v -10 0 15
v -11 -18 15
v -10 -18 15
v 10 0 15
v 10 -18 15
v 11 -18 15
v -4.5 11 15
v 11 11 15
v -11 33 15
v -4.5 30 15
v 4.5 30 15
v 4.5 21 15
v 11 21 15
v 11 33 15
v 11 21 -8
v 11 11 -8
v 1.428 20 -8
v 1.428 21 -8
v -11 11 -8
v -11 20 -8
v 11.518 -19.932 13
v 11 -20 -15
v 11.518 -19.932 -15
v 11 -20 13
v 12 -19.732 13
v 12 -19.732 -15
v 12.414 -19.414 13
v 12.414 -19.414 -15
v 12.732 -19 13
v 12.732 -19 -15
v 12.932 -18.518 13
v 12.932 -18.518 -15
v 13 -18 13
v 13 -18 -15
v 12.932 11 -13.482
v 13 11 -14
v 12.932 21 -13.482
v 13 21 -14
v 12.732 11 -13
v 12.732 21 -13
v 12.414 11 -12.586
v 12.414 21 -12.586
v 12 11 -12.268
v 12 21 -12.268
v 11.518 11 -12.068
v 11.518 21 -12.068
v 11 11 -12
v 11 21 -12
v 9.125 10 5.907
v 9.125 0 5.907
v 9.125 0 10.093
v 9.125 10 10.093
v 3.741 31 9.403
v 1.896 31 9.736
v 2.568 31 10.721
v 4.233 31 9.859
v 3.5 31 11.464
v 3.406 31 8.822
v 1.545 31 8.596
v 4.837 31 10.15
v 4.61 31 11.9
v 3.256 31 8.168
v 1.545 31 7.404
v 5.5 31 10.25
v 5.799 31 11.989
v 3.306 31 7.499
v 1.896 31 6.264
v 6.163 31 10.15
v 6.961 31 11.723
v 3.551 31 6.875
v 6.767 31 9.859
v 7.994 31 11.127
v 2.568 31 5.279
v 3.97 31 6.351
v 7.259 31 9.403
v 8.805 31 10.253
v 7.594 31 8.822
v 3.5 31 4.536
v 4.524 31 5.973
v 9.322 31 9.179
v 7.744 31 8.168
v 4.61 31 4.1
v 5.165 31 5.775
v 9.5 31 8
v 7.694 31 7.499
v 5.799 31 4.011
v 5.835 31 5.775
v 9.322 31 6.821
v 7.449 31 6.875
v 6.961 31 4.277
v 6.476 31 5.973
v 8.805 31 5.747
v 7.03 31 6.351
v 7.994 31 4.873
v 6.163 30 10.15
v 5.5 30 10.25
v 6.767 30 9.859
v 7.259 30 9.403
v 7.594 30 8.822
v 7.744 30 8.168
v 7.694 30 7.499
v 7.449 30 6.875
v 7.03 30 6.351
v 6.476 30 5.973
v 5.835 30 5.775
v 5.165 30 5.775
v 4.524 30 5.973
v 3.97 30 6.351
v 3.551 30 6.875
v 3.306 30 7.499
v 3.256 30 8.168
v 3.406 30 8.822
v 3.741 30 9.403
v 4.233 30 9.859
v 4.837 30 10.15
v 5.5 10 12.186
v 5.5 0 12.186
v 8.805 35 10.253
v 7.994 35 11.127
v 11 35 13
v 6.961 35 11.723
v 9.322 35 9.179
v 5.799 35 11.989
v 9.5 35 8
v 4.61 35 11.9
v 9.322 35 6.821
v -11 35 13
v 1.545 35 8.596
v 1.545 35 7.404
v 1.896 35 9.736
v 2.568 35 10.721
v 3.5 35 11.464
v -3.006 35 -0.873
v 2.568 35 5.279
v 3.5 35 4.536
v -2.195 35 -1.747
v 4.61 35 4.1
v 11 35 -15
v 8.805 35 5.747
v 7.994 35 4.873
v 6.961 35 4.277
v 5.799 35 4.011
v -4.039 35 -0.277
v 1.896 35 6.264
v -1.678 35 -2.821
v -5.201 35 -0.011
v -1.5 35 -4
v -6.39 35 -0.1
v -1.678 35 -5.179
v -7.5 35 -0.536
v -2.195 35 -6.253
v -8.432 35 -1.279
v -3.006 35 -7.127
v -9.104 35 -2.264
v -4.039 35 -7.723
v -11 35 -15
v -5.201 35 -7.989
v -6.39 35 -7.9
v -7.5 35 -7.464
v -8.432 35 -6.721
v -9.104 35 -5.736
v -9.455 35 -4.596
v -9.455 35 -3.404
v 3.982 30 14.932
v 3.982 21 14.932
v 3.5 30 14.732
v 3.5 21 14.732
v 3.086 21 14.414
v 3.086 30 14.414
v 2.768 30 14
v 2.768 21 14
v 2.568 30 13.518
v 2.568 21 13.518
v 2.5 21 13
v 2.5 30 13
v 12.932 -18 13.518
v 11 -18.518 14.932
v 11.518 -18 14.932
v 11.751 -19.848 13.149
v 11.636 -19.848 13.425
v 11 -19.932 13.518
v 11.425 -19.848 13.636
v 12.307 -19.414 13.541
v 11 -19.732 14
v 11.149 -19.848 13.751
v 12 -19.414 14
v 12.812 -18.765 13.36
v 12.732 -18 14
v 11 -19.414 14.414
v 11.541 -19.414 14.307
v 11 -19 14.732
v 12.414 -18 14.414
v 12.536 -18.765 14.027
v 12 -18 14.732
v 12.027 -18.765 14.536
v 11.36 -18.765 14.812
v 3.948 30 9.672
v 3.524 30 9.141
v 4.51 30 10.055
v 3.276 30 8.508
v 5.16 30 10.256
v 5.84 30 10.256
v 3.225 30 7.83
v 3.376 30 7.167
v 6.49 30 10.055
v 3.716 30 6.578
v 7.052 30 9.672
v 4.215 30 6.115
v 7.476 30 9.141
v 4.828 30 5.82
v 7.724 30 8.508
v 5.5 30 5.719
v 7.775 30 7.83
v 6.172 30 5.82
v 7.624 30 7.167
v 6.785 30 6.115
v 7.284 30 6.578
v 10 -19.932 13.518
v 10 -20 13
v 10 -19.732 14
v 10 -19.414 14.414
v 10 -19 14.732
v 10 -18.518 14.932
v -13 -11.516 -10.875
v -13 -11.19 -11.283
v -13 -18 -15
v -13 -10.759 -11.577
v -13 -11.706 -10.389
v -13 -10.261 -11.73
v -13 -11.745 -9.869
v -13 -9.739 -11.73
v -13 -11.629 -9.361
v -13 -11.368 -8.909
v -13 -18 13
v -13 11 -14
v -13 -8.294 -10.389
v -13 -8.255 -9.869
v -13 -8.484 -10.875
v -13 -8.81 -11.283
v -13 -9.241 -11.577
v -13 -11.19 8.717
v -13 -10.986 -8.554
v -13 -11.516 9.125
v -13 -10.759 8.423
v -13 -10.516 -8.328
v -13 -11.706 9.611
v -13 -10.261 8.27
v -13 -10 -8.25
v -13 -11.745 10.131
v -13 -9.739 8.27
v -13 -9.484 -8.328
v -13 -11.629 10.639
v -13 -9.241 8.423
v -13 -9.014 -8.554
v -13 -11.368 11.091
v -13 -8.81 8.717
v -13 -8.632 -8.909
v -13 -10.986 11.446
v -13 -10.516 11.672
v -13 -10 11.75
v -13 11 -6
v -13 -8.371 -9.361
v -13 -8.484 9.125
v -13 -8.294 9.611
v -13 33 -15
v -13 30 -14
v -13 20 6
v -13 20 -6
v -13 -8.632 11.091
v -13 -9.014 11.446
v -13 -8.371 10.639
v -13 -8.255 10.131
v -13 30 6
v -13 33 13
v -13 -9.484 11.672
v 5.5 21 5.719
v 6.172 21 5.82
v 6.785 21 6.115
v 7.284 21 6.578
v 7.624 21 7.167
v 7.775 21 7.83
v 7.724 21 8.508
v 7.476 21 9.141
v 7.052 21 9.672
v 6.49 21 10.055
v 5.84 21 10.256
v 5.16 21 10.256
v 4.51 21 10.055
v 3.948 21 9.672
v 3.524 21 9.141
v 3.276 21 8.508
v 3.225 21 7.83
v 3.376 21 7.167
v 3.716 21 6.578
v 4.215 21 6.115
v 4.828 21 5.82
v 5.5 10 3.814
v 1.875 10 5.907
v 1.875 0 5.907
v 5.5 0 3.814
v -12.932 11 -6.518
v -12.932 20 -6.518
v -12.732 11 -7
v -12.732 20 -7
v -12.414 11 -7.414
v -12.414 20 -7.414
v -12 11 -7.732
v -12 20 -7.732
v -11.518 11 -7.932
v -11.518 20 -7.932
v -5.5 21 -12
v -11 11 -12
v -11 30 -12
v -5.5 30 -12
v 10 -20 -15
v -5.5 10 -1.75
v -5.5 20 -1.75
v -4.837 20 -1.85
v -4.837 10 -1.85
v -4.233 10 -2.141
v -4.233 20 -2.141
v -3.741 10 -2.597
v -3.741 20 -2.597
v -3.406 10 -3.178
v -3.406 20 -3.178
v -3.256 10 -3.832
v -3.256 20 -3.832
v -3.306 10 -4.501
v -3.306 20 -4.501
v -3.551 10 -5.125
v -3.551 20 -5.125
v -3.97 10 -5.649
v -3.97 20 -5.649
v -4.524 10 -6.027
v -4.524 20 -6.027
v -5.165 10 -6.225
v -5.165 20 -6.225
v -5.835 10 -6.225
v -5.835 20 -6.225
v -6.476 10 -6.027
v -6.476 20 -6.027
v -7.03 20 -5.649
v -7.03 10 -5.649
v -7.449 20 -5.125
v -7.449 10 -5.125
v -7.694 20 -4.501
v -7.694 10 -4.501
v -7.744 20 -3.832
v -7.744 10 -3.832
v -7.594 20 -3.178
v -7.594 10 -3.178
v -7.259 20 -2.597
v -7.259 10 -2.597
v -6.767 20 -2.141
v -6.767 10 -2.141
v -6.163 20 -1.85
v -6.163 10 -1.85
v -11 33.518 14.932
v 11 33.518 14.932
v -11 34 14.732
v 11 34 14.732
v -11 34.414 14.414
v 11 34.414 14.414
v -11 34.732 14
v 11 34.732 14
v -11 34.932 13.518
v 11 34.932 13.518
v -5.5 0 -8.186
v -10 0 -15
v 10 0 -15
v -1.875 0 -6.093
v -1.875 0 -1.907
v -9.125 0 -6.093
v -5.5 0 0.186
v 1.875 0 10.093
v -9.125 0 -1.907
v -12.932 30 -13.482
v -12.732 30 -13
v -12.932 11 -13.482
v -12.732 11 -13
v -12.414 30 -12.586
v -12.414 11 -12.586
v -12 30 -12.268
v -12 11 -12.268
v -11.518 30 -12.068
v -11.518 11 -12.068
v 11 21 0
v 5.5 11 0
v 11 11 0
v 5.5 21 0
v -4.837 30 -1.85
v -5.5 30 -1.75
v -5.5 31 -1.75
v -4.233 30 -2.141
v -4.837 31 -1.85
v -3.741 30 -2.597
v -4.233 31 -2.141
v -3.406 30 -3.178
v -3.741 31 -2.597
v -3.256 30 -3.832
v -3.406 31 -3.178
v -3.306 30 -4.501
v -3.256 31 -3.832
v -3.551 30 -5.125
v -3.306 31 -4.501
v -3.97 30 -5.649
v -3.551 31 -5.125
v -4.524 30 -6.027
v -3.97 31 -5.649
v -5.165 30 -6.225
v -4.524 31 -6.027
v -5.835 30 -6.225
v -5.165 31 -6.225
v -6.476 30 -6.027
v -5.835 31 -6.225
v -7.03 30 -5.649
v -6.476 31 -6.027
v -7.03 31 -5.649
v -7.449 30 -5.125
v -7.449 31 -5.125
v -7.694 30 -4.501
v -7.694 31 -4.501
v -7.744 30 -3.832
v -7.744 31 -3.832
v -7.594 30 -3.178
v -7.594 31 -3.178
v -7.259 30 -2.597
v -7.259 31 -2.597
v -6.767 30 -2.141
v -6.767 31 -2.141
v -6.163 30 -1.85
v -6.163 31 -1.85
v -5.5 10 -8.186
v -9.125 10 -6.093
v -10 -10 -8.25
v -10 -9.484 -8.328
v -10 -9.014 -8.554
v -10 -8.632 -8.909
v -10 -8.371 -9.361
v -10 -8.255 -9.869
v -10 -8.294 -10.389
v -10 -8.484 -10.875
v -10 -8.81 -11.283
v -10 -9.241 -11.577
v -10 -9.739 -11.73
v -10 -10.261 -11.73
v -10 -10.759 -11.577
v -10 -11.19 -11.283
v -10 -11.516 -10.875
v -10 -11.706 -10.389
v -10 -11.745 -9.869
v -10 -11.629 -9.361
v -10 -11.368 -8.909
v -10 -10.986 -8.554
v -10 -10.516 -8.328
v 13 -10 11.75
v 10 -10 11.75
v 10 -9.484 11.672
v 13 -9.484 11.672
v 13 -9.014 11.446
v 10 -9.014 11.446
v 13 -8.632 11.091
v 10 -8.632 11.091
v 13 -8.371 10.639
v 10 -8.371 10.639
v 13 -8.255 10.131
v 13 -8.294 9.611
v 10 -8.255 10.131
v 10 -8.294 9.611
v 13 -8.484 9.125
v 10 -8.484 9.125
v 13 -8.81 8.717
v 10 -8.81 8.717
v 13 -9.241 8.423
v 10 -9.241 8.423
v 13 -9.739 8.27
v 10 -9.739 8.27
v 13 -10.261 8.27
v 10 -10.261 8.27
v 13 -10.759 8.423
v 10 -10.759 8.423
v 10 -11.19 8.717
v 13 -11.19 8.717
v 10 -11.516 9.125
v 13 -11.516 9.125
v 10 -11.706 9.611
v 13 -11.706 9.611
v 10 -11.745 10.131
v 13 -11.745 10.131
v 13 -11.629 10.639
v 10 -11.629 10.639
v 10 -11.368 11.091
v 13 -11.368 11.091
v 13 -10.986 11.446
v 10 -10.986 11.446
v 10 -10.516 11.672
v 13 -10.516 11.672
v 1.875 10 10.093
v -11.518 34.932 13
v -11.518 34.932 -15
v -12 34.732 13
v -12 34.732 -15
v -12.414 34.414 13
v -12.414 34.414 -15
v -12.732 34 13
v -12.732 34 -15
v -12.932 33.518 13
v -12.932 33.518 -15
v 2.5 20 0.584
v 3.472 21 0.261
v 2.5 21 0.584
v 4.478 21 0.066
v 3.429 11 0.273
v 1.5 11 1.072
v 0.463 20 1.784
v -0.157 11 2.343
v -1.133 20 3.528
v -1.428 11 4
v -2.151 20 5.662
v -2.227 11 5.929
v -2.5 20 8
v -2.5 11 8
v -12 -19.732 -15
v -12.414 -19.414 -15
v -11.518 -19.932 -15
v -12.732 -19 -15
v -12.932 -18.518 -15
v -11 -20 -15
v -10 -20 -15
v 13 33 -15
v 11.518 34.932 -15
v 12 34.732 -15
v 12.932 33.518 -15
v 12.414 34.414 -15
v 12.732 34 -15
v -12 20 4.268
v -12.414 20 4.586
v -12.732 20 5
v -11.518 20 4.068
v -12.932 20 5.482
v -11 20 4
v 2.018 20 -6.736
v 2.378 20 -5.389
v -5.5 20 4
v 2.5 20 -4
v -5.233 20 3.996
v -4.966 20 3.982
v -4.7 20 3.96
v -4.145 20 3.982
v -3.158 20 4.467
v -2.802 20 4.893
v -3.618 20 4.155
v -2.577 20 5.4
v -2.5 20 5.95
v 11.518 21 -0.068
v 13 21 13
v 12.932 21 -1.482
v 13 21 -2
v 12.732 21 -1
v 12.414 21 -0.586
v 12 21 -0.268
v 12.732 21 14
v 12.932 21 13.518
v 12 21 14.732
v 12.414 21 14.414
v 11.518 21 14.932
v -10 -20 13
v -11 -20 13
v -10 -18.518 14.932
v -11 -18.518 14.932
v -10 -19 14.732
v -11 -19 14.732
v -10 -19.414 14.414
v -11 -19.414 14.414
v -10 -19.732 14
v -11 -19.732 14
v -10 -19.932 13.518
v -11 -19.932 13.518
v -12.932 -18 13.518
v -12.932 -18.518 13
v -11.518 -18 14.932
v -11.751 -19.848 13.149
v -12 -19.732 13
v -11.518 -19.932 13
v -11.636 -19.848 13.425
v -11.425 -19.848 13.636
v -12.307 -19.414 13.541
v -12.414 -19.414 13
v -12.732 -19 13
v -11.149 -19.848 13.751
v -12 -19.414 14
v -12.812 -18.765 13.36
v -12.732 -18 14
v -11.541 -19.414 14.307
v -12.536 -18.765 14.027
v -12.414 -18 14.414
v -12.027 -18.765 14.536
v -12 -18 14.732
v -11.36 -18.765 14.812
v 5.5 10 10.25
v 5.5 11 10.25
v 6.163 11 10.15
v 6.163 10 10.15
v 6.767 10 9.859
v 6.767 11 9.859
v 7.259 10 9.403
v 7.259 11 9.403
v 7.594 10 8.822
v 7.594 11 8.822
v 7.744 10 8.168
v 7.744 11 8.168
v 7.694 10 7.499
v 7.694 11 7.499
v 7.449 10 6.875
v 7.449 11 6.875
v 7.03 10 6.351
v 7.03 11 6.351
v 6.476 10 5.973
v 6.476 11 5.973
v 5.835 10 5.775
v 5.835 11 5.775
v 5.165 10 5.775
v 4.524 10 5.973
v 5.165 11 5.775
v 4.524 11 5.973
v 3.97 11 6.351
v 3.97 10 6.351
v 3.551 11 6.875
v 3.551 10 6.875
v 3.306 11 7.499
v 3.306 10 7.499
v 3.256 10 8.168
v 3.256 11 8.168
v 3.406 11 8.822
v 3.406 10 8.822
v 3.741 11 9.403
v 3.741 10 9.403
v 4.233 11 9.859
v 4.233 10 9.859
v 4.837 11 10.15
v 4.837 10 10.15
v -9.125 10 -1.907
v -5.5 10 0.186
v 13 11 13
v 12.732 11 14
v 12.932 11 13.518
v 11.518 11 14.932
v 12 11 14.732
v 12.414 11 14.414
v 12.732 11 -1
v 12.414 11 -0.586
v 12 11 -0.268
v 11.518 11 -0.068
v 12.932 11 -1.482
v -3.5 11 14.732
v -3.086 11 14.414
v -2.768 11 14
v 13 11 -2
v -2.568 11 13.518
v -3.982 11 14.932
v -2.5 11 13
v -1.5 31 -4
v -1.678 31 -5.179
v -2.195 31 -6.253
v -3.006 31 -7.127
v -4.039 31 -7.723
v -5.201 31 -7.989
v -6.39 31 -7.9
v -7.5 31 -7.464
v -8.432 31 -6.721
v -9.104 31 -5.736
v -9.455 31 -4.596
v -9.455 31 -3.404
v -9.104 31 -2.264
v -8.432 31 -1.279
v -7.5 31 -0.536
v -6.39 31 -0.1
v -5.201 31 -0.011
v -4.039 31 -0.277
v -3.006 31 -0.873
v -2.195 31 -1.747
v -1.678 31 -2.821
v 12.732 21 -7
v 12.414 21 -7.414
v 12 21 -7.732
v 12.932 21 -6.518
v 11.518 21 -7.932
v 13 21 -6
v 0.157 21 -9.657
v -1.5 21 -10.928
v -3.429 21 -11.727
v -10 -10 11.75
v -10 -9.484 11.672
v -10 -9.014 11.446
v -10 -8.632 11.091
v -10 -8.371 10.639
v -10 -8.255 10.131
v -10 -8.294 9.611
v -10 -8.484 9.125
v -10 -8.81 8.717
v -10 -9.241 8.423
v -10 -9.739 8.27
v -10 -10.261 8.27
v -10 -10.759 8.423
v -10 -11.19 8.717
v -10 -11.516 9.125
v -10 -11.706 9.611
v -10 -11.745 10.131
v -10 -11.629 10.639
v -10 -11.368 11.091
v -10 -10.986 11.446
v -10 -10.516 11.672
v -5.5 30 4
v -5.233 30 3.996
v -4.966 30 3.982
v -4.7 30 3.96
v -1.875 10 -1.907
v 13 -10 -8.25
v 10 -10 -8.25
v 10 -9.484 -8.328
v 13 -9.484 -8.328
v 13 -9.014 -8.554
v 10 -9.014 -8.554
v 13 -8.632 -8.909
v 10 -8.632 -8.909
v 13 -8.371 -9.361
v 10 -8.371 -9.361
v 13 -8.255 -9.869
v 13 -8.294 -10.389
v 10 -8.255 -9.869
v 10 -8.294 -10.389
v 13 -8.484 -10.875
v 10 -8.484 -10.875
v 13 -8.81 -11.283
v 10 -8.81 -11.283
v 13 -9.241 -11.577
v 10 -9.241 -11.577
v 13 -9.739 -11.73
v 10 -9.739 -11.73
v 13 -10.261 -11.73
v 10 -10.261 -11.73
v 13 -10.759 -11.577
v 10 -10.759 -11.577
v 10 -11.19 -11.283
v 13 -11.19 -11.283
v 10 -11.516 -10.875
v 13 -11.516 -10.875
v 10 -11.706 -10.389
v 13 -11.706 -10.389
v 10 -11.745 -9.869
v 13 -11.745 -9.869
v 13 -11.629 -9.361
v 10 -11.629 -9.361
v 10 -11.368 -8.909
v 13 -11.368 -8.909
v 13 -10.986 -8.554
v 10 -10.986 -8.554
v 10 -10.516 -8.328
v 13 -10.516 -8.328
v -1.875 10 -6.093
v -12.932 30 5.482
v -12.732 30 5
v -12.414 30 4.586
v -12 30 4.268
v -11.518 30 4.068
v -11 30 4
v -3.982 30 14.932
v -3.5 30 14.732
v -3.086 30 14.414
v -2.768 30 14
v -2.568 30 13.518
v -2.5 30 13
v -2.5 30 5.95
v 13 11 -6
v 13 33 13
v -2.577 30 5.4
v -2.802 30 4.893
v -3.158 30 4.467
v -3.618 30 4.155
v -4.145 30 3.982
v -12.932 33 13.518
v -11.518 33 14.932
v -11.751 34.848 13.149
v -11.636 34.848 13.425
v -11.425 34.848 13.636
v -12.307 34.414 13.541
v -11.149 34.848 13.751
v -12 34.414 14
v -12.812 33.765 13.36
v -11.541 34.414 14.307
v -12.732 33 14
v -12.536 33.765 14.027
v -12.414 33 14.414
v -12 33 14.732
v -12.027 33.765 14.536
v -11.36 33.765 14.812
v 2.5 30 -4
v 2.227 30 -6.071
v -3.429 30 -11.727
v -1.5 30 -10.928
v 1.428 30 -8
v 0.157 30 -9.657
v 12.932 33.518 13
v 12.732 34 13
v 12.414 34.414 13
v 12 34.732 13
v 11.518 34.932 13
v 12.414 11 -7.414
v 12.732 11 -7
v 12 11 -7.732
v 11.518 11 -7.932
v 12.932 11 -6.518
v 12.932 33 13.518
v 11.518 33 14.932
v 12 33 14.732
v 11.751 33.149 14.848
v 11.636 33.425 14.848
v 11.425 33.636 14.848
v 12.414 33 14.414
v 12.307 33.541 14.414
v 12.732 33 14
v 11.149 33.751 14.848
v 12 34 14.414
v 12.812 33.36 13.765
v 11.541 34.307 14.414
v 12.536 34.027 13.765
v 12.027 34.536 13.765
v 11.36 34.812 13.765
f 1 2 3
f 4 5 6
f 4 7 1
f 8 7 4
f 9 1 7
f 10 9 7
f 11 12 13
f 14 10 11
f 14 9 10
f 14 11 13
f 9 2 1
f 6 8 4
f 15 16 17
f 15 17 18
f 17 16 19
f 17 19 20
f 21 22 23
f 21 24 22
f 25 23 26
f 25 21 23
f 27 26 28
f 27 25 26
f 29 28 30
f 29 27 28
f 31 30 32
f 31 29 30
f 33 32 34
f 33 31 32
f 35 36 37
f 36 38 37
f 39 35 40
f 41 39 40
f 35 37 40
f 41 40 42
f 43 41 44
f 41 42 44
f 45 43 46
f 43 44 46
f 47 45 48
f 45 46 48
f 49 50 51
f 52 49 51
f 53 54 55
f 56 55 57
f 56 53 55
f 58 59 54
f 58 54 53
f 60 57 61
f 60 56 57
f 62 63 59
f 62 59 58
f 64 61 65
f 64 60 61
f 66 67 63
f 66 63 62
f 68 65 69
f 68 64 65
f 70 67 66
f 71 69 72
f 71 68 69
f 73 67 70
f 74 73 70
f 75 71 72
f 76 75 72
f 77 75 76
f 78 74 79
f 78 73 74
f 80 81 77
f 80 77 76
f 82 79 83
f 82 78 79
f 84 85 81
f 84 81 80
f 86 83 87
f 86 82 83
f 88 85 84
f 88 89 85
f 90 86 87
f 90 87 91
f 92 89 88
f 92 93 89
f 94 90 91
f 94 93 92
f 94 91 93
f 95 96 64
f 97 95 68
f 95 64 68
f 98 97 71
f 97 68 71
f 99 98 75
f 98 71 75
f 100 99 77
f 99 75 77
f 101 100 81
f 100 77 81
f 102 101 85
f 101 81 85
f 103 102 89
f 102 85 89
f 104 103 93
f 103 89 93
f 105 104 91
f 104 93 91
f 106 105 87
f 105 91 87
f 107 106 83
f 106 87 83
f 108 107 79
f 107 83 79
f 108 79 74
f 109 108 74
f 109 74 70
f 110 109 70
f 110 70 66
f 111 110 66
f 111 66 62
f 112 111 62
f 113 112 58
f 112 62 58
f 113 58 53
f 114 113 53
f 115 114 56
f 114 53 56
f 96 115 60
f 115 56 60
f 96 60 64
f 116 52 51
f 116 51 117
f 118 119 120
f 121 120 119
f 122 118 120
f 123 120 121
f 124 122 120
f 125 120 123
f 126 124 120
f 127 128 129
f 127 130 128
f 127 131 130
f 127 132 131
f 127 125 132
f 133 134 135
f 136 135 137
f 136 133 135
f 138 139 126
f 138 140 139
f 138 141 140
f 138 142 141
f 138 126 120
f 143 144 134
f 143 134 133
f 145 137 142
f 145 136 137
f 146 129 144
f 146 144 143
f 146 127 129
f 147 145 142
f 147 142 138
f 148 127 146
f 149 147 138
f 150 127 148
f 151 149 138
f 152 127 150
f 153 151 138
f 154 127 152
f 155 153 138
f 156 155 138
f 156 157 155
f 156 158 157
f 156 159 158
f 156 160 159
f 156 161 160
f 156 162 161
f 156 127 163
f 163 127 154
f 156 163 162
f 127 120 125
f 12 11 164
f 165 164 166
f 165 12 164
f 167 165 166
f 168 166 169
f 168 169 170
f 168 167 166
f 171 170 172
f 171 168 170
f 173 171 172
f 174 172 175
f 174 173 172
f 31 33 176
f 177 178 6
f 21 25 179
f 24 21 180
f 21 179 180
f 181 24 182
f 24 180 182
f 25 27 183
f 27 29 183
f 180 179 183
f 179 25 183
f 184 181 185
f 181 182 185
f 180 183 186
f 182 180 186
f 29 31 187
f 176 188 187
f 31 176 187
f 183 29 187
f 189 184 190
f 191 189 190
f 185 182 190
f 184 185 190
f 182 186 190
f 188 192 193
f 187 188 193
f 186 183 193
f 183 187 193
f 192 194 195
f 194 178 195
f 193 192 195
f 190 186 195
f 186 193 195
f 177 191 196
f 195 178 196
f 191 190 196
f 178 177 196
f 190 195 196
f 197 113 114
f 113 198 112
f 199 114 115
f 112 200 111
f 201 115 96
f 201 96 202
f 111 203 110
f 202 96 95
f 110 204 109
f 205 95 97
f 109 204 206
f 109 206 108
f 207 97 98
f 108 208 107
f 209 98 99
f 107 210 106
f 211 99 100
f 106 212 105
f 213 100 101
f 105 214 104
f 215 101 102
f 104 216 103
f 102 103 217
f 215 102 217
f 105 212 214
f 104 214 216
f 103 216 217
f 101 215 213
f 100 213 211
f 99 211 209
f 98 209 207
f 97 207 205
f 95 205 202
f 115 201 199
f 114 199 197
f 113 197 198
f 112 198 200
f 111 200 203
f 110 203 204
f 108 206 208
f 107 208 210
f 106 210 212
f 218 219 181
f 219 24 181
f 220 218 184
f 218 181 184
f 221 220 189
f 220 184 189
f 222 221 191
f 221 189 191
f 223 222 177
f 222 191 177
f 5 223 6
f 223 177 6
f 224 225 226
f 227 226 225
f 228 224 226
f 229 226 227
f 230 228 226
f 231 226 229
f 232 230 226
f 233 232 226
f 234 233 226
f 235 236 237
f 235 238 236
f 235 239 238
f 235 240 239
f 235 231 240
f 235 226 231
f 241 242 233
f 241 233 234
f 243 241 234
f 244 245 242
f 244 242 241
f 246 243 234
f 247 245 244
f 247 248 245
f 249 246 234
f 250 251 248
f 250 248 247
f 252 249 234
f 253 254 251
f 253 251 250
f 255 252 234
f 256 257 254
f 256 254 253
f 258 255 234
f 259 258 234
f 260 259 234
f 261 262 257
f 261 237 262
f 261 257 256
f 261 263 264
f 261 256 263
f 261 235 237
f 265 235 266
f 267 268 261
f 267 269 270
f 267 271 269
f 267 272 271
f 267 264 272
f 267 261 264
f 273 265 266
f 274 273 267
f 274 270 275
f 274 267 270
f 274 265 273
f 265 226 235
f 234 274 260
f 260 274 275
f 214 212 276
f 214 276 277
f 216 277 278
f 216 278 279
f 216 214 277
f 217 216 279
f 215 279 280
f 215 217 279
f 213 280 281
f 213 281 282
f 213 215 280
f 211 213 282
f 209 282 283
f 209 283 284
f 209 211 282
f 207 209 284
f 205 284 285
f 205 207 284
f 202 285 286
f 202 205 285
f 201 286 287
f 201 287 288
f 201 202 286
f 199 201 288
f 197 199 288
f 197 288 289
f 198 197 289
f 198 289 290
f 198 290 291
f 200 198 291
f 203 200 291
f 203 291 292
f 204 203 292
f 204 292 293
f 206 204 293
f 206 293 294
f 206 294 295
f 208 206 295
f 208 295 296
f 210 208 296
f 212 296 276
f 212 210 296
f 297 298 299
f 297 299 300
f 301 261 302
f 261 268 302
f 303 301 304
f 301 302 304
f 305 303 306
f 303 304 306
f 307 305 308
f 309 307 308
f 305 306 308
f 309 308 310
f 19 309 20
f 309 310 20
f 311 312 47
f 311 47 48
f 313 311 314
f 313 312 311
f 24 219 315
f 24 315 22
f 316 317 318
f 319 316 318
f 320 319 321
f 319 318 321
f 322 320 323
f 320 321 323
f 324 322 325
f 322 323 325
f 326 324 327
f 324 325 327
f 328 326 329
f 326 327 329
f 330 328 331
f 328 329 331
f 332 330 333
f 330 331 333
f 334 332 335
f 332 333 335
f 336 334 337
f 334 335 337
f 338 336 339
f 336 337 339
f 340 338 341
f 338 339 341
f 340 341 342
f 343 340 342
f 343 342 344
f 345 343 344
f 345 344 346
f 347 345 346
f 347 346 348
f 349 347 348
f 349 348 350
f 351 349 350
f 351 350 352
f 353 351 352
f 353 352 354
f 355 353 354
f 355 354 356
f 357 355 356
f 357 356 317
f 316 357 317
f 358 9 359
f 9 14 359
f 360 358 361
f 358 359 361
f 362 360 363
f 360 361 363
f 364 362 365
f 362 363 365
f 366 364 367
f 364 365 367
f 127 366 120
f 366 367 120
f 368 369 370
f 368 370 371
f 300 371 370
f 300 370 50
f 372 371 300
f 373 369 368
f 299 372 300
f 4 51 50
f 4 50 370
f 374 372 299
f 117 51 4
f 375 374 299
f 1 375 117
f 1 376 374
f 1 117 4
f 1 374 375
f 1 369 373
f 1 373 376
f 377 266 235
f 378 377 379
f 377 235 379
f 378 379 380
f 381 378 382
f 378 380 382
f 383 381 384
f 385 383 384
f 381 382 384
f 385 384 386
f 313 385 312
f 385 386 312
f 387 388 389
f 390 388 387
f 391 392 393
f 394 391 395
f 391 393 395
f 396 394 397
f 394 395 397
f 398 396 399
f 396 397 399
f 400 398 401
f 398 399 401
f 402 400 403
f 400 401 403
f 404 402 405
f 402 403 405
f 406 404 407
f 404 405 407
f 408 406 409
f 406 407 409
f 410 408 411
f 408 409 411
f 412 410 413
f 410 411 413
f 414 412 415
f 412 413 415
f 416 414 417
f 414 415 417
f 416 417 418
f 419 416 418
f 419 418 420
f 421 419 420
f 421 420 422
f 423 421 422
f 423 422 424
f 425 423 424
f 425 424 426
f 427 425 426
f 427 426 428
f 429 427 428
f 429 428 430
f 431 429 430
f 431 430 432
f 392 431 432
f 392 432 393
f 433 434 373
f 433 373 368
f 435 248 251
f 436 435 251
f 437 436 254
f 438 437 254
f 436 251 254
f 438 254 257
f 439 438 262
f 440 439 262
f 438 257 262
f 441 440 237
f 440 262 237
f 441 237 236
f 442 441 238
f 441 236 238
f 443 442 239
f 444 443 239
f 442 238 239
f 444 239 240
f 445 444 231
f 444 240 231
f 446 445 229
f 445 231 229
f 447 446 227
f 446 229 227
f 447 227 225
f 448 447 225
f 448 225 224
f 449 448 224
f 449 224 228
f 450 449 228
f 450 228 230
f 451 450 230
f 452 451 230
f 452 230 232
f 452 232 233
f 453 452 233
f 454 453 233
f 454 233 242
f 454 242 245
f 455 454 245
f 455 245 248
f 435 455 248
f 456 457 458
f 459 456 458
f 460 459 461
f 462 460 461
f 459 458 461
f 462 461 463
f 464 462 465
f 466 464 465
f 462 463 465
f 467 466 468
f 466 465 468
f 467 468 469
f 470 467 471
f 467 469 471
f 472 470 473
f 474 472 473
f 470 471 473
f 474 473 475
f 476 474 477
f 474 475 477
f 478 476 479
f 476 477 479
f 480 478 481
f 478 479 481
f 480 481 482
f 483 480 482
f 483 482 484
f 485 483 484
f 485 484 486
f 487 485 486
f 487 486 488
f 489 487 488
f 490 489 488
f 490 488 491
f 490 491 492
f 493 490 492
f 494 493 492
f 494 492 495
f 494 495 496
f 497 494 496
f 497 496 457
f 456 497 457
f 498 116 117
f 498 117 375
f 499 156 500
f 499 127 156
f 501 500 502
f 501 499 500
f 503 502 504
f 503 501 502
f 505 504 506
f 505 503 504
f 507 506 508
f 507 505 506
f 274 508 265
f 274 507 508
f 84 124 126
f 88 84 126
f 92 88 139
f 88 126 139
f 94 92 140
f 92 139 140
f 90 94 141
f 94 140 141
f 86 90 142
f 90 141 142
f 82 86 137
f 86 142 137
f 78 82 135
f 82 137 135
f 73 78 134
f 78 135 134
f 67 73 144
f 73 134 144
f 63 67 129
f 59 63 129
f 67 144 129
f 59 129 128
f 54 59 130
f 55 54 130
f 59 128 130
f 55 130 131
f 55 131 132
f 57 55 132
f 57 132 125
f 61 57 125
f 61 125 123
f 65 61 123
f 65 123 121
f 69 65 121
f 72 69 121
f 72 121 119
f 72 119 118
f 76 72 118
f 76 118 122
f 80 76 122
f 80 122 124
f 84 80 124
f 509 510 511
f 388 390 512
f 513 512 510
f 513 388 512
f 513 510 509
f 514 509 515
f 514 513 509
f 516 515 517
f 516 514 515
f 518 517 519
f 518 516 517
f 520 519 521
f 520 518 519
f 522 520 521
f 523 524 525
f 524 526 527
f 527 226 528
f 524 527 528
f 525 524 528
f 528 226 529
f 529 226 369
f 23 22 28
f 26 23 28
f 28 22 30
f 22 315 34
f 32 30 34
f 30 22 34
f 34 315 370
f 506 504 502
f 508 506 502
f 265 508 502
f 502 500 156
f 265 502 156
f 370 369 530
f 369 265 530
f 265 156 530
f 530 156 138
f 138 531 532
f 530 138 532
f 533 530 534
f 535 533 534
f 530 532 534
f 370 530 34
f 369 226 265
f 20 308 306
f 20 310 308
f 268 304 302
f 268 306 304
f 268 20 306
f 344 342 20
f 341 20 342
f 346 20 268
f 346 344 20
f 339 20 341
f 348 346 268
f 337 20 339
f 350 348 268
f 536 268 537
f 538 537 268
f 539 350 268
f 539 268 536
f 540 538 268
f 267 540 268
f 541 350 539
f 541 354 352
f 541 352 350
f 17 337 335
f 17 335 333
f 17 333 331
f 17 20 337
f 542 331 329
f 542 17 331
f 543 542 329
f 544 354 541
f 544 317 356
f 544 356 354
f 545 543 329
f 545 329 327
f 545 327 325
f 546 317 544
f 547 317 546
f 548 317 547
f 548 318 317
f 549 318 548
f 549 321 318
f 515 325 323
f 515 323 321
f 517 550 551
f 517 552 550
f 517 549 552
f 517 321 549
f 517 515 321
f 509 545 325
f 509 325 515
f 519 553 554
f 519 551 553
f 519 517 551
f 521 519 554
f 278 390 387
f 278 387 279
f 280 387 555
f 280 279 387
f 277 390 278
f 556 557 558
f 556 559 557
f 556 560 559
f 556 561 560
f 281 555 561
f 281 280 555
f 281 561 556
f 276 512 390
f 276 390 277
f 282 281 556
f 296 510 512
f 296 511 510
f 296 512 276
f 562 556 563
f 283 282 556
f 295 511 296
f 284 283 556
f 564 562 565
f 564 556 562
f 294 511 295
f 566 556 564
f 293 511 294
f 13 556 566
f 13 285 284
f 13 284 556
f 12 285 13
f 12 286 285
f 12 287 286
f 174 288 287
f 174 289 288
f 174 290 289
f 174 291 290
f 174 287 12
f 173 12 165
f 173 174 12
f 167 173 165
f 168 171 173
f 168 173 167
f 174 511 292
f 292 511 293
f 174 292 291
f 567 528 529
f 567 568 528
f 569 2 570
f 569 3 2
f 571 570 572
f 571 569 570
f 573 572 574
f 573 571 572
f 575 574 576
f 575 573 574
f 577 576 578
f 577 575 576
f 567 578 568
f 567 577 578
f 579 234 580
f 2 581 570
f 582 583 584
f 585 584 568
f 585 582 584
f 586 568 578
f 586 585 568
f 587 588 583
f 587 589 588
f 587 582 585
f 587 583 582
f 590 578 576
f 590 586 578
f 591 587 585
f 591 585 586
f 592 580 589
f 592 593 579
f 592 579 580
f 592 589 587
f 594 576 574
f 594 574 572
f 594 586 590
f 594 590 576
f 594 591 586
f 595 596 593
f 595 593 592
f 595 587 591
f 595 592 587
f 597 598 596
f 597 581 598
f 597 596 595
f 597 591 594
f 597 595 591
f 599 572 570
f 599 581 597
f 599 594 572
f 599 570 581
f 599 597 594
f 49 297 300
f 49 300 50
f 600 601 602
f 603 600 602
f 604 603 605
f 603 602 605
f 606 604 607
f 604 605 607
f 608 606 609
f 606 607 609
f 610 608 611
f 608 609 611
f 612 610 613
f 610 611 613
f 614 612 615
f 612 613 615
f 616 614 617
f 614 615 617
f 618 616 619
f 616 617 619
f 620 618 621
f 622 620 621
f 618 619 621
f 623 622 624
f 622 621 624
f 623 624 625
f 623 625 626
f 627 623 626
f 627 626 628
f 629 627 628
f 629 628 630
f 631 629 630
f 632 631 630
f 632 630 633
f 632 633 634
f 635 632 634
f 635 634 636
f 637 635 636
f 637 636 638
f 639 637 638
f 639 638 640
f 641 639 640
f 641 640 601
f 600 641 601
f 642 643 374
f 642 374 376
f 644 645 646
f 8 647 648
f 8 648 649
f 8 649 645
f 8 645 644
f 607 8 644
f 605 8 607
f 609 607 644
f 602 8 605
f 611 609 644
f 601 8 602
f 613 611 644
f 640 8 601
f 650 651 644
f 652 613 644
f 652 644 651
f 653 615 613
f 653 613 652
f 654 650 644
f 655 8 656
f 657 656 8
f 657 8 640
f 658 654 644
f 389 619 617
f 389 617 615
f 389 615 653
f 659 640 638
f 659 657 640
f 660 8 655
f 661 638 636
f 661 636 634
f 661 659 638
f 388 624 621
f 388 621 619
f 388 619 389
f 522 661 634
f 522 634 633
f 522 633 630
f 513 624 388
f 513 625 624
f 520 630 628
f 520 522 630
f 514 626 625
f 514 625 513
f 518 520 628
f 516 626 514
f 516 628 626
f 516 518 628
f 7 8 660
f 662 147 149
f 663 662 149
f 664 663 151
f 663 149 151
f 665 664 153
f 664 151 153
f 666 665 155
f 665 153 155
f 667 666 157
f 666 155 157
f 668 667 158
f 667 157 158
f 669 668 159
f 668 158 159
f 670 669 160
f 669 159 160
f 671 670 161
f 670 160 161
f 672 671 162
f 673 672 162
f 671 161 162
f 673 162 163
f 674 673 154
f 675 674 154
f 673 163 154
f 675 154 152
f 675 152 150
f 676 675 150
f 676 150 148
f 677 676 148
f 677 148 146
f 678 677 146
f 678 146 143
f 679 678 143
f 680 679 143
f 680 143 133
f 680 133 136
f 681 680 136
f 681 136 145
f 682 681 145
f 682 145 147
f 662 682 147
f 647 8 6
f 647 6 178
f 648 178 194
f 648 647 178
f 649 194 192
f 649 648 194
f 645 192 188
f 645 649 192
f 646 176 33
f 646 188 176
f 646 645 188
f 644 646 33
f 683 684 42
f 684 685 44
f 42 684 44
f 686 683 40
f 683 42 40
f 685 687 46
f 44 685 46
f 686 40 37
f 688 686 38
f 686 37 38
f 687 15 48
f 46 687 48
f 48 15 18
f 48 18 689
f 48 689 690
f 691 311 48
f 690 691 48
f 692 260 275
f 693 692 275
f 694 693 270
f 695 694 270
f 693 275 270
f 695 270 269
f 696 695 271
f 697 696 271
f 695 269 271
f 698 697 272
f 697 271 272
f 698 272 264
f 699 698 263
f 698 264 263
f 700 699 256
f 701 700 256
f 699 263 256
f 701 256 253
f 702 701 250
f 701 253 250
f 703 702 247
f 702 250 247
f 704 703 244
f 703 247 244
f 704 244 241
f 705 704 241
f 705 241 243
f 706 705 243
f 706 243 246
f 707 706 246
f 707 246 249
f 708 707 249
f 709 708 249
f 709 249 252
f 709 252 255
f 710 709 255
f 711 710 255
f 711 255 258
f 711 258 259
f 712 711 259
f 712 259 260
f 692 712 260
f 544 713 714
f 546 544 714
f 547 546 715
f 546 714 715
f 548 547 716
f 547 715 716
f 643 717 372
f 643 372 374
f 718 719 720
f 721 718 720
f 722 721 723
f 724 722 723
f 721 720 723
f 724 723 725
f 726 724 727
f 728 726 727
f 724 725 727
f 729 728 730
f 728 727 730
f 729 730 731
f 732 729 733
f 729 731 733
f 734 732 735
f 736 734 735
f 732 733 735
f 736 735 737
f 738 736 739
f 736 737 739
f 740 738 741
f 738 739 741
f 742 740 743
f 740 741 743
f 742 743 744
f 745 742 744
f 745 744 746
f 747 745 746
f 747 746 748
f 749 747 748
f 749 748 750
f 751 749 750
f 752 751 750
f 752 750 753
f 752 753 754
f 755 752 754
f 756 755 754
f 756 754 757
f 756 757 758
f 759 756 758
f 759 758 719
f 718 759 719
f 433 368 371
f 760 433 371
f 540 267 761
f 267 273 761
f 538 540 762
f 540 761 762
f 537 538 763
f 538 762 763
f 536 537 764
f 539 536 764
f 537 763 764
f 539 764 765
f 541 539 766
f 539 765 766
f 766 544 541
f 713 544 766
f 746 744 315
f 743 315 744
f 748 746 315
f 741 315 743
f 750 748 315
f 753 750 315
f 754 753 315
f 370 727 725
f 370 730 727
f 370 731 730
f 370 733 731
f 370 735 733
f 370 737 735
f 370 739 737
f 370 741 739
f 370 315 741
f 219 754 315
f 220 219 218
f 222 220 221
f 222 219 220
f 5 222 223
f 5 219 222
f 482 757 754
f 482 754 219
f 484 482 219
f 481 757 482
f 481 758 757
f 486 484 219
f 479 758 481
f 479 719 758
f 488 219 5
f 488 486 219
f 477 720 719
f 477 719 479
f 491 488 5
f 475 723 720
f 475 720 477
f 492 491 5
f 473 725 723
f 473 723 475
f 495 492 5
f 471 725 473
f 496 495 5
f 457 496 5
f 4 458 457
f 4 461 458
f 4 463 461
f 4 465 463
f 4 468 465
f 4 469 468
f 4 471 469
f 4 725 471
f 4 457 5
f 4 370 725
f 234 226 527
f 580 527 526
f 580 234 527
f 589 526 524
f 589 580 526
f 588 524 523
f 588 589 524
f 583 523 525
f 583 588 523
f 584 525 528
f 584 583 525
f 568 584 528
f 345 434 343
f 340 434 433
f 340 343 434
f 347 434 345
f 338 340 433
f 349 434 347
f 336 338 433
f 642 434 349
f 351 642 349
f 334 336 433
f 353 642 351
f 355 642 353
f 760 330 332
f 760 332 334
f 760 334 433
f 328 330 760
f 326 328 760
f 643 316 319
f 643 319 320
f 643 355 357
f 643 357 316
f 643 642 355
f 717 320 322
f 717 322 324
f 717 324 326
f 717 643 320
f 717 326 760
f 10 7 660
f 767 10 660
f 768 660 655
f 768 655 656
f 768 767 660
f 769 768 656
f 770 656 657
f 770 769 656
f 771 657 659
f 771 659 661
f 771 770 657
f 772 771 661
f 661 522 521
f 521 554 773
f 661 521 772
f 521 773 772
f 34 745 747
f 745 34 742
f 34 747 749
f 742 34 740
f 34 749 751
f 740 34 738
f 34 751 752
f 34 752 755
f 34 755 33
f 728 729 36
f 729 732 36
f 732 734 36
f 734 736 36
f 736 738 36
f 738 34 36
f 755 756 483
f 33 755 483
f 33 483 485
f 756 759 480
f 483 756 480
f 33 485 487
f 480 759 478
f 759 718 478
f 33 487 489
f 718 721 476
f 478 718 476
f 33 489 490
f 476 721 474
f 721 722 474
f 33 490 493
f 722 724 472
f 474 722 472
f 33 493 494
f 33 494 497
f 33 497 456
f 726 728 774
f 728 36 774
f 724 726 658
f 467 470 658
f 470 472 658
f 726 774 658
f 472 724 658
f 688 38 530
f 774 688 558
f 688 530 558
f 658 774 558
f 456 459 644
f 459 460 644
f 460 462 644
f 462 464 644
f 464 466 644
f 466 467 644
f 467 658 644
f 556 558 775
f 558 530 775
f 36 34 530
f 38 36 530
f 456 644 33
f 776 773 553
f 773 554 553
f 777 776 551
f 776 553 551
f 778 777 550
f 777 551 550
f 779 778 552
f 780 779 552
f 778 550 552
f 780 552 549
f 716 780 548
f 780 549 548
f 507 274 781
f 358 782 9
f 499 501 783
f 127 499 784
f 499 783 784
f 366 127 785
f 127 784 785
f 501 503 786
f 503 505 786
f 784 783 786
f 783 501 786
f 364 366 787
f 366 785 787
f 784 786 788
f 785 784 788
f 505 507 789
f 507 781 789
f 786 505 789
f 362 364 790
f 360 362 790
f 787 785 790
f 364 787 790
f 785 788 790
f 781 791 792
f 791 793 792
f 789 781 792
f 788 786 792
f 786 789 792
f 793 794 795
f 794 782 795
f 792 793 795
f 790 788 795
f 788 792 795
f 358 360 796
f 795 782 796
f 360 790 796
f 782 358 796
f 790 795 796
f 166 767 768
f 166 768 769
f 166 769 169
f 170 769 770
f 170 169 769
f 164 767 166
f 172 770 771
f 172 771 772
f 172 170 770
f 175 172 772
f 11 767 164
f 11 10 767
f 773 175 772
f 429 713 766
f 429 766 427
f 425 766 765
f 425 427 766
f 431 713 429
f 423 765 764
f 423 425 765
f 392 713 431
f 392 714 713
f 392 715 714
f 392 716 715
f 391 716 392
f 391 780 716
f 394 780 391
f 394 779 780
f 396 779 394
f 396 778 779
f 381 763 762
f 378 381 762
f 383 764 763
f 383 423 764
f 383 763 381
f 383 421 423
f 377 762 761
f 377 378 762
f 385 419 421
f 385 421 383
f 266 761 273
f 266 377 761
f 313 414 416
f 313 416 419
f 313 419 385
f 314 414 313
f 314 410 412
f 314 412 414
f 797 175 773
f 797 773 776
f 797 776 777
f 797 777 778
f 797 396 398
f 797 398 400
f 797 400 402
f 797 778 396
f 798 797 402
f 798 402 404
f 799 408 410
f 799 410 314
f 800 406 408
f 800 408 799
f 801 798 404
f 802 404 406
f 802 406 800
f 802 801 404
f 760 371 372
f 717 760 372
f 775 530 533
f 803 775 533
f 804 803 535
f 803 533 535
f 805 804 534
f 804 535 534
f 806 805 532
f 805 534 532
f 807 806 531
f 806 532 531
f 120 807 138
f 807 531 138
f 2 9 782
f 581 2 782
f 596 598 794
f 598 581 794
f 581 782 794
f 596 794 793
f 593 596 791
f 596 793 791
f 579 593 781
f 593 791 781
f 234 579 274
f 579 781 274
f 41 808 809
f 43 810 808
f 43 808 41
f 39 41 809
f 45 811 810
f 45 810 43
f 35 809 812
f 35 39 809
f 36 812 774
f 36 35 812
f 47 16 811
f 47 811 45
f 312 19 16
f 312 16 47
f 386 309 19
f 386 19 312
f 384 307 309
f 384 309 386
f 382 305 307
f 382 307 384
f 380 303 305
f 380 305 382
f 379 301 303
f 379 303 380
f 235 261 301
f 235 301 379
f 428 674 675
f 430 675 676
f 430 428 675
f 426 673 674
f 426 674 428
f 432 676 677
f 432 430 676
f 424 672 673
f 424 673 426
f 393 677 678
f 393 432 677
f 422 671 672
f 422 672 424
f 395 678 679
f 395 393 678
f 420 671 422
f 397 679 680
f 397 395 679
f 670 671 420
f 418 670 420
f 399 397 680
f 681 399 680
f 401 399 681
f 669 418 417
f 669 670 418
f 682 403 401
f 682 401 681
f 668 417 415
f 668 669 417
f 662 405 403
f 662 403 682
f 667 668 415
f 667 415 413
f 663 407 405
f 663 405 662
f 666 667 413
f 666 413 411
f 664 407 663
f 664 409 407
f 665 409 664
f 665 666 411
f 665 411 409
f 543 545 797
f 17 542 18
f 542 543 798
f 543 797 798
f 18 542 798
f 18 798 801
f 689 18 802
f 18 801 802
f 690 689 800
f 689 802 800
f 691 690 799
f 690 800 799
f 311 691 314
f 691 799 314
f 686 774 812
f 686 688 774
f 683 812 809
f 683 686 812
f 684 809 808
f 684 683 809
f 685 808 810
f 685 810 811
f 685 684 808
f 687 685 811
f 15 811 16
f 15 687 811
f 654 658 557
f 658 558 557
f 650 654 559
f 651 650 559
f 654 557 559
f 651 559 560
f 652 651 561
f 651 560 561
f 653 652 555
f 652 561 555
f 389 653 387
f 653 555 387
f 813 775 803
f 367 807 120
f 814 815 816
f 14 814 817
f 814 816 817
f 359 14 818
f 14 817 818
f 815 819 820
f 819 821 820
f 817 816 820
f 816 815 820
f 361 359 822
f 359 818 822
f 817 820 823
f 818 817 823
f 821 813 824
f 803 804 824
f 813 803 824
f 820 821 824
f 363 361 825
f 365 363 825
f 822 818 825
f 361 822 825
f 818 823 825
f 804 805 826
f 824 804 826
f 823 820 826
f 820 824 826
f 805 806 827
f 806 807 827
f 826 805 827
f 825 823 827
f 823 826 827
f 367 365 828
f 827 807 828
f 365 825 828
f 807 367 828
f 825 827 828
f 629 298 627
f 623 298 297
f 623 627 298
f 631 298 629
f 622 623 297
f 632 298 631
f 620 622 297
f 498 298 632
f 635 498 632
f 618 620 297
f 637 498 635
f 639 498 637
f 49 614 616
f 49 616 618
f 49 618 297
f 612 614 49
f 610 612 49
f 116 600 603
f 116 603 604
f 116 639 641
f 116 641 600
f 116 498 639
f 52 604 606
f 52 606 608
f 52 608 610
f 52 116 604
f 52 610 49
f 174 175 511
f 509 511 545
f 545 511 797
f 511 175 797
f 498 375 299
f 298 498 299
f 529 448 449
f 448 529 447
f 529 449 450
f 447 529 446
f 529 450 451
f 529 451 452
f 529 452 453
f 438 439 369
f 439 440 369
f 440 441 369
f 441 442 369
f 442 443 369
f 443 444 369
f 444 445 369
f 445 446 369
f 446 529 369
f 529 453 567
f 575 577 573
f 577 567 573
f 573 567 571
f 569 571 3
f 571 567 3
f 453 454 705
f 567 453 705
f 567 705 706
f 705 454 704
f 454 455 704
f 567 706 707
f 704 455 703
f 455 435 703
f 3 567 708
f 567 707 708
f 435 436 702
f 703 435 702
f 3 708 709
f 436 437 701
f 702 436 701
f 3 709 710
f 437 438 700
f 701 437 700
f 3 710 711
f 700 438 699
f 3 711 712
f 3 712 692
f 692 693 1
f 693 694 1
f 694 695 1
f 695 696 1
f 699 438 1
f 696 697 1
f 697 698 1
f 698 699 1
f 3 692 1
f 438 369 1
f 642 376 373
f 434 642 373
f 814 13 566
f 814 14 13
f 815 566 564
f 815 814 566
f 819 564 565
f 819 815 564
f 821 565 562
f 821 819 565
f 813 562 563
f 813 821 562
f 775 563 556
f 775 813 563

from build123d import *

# Parameters (mm, degrees)
SKETCH2_W                                           = 20
SKETCH2_H                                           = 30
BOSS_EXTRUDE1_DEPTH                                 = 30
SKETCH3_R                                           = 2.25
CUT_EXTRUDE2_DEPTH                                  = 19
SKETCH5_W                                           = 20
SKETCH5_H                                           = 30
BOSS_EXTRUDE2_DEPTH                                 = 5
SKETCH6_R                                           = 2.281198657
BOSS_EXTRUDE3_DEPTH                                 = 9
BOSS_EXTRUDE4_START                                 = 9
SKETCH7_R                                           = 2.25
BOSS_EXTRUDE4_DEPTH                                 = 9
BOSS_EXTRUDE6_DEPTH                                 = 9
SKETCH8_R                                           = 2.25
CUT_EXTRUDE3_DEPTH                                  = 40.37003937
CBORE_FOR_M4_HEX_SOCKET_HEAD_CAP_SCREW1_D           = 4.5
CBORE_FOR_M4_HEX_SOCKET_HEAD_CAP_SCREW1_DEPTH       = 35
CBORE_FOR_M4_HEX_SOCKET_HEAD_CAP_SCREW1_CBORE_D     = 8
CBORE_FOR_M4_HEX_SOCKET_HEAD_CAP_SCREW1_CBORE_DEPTH = 4
CUT_EXTRUDE6_DEPTH                                  = 10
CUT_EXTRUDE10_DEPTH                                 = 10
CUT_EXTRUDE11_DEPTH                                 = 10
SKETCH26_W                                          = 4
SKETCH26_H                                          = 10
CUT_EXTRUDE12_DEPTH                                 = 44.011626335
SKETCH32_W                                          = 30
SKETCH32_H                                          = 35
BOSS_EXTRUDE15_DEPTH                                = 3
SKETCH33_W                                          = 4
SKETCH33_H                                          = 10
BOSS_EXTRUDE16_DEPTH                                = 3
SKETCH34_W                                          = 3
SKETCH34_H                                          = 30
BOSS_EXTRUDE17_DEPTH                                = 20
SKETCH35_W                                          = 3
SKETCH35_H                                          = 30
BOSS_EXTRUDE18_DEPTH                                = 20
SKETCH37_R                                          = 1.75
CUT_EXTRUDE15_DEPTH                                 = 47.108567534
FILLET1_R_R                                         = 2
FILLET2_R_R                                         = 2


with BuildPart() as part:
    # Sketch2 → Boss-Extrude1 (new body)
    with BuildSketch(Plane(origin=(0, 0, 0), x_dir=(1, 0, 0), z_dir=(0, 1, 0))):
        Rectangle(SKETCH2_W, SKETCH2_H)
    extrude(amount=BOSS_EXTRUDE1_DEPTH)

    # Sketch3 → Cut-Extrude2 (cut)
    with BuildSketch(Plane(origin=(0, 30, 0), x_dir=(1, 0, 0), z_dir=(0, 1, 0))):
        with BuildLine():
            Line((-1.5, -15), (10, -15))
            Line((10, -15), (10, -1))
            Line((10, -1), (5.5, -1))
            ThreePointArc((5.5, -1), (3.403805654, -1.321229959), (1.5, -2.255437353))
            Line((1.5, -2.255437353), (1.5, 4))
            ThreePointArc((1.5, 4), (1.178770041, 6.096194346), (0.244562647, 8))
            Line((0.244562647, 8), (10, 8))
            Line((10, 8), (10, 11))
            Line((10, 11), (-10, 11))
            Line((-10, 11), (-10, -3))
            Line((-10, -3), (-5.5, -3))
            ThreePointArc((-5.5, -3), (-3.403805654, -2.678770041), (-1.5, -1.744562647))
            Line((-1.5, -1.744562647), (-1.5, -15))
        make_face()
        with Locations(Location((5.5, -8, 0), (0, 0, 270))):
            Circle(SKETCH3_R, mode=Mode.SUBTRACT)
        with Locations(Location((-5.5, 4, 0), (0, 0, 270))):
            Circle(SKETCH3_R, mode=Mode.SUBTRACT)
    extrude(amount=-CUT_EXTRUDE2_DEPTH, mode=Mode.SUBTRACT)

    # Sketch5 → Boss-Extrude2 (add)
    with BuildSketch(Plane(origin=(0, 30, 0), x_dir=(1, 0, 0), z_dir=(0, 1, 0))):
        Rectangle(SKETCH5_W, SKETCH5_H)
    extrude(amount=BOSS_EXTRUDE2_DEPTH)

    # Sketch6 → Boss-Extrude3 (add)
    with BuildSketch(Plane.XZ.offset(-30)):
        with BuildLine():
            Line((1.5, 2.255437353), (1.5, 15))
            Line((1.5, 15), (10, 15))
            Line((10, 15), (10, 1))
            Line((10, 1), (5.5, 1))
            ThreePointArc((5.5, 1), (3.403805654, 1.321229959), (1.5, 2.255437353))
        make_face()
        with Locations(Location((5.5, 8, 0), (0, 0, 270))):
            Circle(SKETCH6_R, mode=Mode.SUBTRACT)
    extrude(amount=BOSS_EXTRUDE3_DEPTH)

    # Sketch7 → Boss-Extrude4 (add)
    with BuildSketch(Plane(origin=(0, 11, 0), x_dir=(1, 0, 0), z_dir=(0, 1, 0)).offset(BOSS_EXTRUDE4_START)):
        with BuildLine():
            ThreePointArc((1.5, 4), (1.178770041, 6.096194346), (0.244562647, 8))
            Line((0.244562647, 8), (-10, 8))
            Line((-10, 8), (-10, -3))
            Line((-10, -3), (-5.5, -3))
            ThreePointArc((-5.5, -3), (-3.403805654, -2.678770041), (-1.5, -1.744562647))
            Line((-1.5, -1.744562647), (-1.5, -8))
            ThreePointArc((-1.5, -8), (-0.704836823, -4.759629651), (1.5, -2.255437353))
            Line((1.5, -2.255437353), (1.5, 4))
        make_face()
        with Locations((-5.5, 4)):
            Circle(SKETCH7_R, mode=Mode.SUBTRACT)
    extrude(amount=-BOSS_EXTRUDE4_DEPTH)

    # Sketch15 → Boss-Extrude6 (add)
    with BuildSketch(Plane.XZ.offset(-30)):
        with BuildLine():
            Line((10, -8), (10, -11))
            Line((10, -11), (-5.5, -11))
            ThreePointArc((-5.5, -11), (-2.259629651, -10.204836823), (0.244562647, -8))
            Line((0.244562647, -8), (10, -8))
        make_face()
    extrude(amount=BOSS_EXTRUDE6_DEPTH)

    # Sketch8 → Cut-Extrude3 (cut, through all)
    with BuildSketch(Plane(origin=(0, 35, 0), x_dir=(1, 0, 0), z_dir=(0, 1, 0))):
        with Locations(Location((5.5, -8, 0), (0, 0, 270))):
            Circle(SKETCH8_R)
        with Locations(Location((-5.5, 4, 0), (0, 0, 270))):
            Circle(SKETCH8_R)
    extrude(amount=-CUT_EXTRUDE3_DEPTH, mode=Mode.SUBTRACT)

    # CBORE for M4 Hex Socket Head Cap Screw1
    with Locations(Plane(origin=(0, 35, 0), x_dir=(1, 0, 0), z_dir=(0, 1, 0))):
        with Locations((5.5, -8), (-5.5, 4)):
            CounterBoreHole(CBORE_FOR_M4_HEX_SOCKET_HEAD_CAP_SCREW1_D / 2, CBORE_FOR_M4_HEX_SOCKET_HEAD_CAP_SCREW1_CBORE_D / 2, CBORE_FOR_M4_HEX_SOCKET_HEAD_CAP_SCREW1_CBORE_DEPTH, depth=CBORE_FOR_M4_HEX_SOCKET_HEAD_CAP_SCREW1_DEPTH)

    # Sketch14 → Cut-Extrude6 (cut)
    with BuildSketch(Plane.XZ):
        Polygon((5.5, 3.814210548), (9.125, 5.907105274), (9.125, 10.092894726), (5.5, 12.185789452), (1.875, 10.092894726), (1.875, 5.907105274), align=None)
        Polygon((-5.5, -8.185789452), (-1.875, -6.092894726), (-1.875, -1.907105274), (-5.5, 0.185789452), (-9.125, -1.907105274), (-9.125, -6.092894726), align=None)
    extrude(amount=-CUT_EXTRUDE6_DEPTH, mode=Mode.SUBTRACT)

    # Sketch24 → Cut-Extrude10 (cut)
    with BuildSketch(Plane(origin=(0, 11, 0), x_dir=(1, 0, 0), z_dir=(0, 1, 0))):
        with BuildLine():
            Line((-2.5, -16), (11, -16))
            Line((11, -16), (11, 0))
            Line((11, 0), (5.5, 0))
            ThreePointArc((5.5, 0), (-0.156854249, -2.343145751), (-2.5, -8))
            Line((-2.5, -8), (-2.5, -16))
        make_face()
    extrude(amount=CUT_EXTRUDE10_DEPTH, mode=Mode.SUBTRACT)

    # Sketch25 → Cut-Extrude11 (cut)
    with BuildSketch(Plane.XZ.offset(-30)):
        with BuildLine():
            Line((-10, -12), (-10, 4))
            Line((-10, 4), (-5.5, 4))
            ThreePointArc((-5.5, 4), (-3.9718619, 3.85269342), (-2.5, 3.416198487))
            Line((-2.5, 3.416198487), (-2.5, 15))
            Line((-2.5, 15), (2.5, 15))
            Line((2.5, 15), (2.5, -4))
            ThreePointArc((2.5, -4), (0.156854249, -9.656854249), (-5.5, -12))
            Line((-5.5, -12), (-10, -12))
        make_face()
    extrude(amount=CUT_EXTRUDE11_DEPTH, mode=Mode.SUBTRACT)

    # Sketch26 → Cut-Extrude12 (cut, through all)
    with BuildSketch(Plane.ZY.offset(10)):
        with Locations((-10, 16)):
            Rectangle(SKETCH26_W, SKETCH26_H)
    extrude(amount=-CUT_EXTRUDE12_DEPTH, mode=Mode.SUBTRACT)

    # Sketch32 → Boss-Extrude15 (add)
    with BuildSketch(Plane.ZY.offset(10)):
        with Locations((0, 17.5)):
            Rectangle(SKETCH32_W, SKETCH32_H)
        Polygon((-12, 11), (-8, 11), (-8, 20), (4, 20), (4, 30), (-12, 30), align=None, mode=Mode.SUBTRACT)
    extrude(amount=BOSS_EXTRUDE15_DEPTH)

    # Sketch33 → Boss-Extrude16 (add)
    with BuildSketch(Plane(origin=(10, 0, 0), x_dir=(0, 0, -1), z_dir=(1, 0, 0))):
        Polygon((15, 35), (15, 0), (-15, 0), (-15, 11), (0, 11), (0, 21), (-15, 21), (-15, 35), align=None)
        with Locations((10, 16)):
            Rectangle(SKETCH33_W, SKETCH33_H, mode=Mode.SUBTRACT)
    extrude(amount=BOSS_EXTRUDE16_DEPTH)

    # Sketch34 → Boss-Extrude17 (add)
    with BuildSketch(Plane.XZ):
        with Locations((-11.5, 0)):
            Rectangle(SKETCH34_W, SKETCH34_H)
    extrude(amount=BOSS_EXTRUDE17_DEPTH)

    # Sketch35 → Boss-Extrude18 (add)
    with BuildSketch(Plane.XZ):
        with Locations((11.5, 0)):
            Rectangle(SKETCH35_W, SKETCH35_H)
    extrude(amount=BOSS_EXTRUDE18_DEPTH)

    # Sketch37 → Cut-Extrude15 (cut, through all)
    with BuildSketch(Plane.ZY.offset(13)):
        with Locations((-10, -10)):
            Circle(SKETCH37_R)
        with Locations((10, -10)):
            Circle(SKETCH37_R)
    extrude(amount=-CUT_EXTRUDE15_DEPTH, mode=Mode.SUBTRACT)

    # Fillet1-r
    fillet1_r_edges = [part.edges().sort_by_distance(p)[0] for p in [
        (-13, 7.5, 15),
        (-13, 35, 0),
        (13, 35, 0),
        (13, 28, 15),
        (13, -4.5, 15),
        (-13, -20, 0),
        (-11.5, -20, 15),
        (13, -20, 0),
        (11.5, -20, 15),
        (0, 35, 15),
    ]]
    fillet(fillet1_r_edges, radius=FILLET1_R_R)

    # Fillet2-r
    fillet2_r_edges = [part.edges().sort_by_distance(p)[0] for p in [
        (-2.5, 20.5, 15),
        (2.5, 25.5, 15),
        (-2.5, 25, 3.416198487),
        (-13, 20.5, -12),
        (-13, 15.5, -8),
        (-13, 25, 4),
        (13, 16, 0),
        (13, 16, -8),
        (13, 16, -12),
    ]]
    fillet(fillet2_r_edges, radius=FILLET2_R_R)


solid = part.part
